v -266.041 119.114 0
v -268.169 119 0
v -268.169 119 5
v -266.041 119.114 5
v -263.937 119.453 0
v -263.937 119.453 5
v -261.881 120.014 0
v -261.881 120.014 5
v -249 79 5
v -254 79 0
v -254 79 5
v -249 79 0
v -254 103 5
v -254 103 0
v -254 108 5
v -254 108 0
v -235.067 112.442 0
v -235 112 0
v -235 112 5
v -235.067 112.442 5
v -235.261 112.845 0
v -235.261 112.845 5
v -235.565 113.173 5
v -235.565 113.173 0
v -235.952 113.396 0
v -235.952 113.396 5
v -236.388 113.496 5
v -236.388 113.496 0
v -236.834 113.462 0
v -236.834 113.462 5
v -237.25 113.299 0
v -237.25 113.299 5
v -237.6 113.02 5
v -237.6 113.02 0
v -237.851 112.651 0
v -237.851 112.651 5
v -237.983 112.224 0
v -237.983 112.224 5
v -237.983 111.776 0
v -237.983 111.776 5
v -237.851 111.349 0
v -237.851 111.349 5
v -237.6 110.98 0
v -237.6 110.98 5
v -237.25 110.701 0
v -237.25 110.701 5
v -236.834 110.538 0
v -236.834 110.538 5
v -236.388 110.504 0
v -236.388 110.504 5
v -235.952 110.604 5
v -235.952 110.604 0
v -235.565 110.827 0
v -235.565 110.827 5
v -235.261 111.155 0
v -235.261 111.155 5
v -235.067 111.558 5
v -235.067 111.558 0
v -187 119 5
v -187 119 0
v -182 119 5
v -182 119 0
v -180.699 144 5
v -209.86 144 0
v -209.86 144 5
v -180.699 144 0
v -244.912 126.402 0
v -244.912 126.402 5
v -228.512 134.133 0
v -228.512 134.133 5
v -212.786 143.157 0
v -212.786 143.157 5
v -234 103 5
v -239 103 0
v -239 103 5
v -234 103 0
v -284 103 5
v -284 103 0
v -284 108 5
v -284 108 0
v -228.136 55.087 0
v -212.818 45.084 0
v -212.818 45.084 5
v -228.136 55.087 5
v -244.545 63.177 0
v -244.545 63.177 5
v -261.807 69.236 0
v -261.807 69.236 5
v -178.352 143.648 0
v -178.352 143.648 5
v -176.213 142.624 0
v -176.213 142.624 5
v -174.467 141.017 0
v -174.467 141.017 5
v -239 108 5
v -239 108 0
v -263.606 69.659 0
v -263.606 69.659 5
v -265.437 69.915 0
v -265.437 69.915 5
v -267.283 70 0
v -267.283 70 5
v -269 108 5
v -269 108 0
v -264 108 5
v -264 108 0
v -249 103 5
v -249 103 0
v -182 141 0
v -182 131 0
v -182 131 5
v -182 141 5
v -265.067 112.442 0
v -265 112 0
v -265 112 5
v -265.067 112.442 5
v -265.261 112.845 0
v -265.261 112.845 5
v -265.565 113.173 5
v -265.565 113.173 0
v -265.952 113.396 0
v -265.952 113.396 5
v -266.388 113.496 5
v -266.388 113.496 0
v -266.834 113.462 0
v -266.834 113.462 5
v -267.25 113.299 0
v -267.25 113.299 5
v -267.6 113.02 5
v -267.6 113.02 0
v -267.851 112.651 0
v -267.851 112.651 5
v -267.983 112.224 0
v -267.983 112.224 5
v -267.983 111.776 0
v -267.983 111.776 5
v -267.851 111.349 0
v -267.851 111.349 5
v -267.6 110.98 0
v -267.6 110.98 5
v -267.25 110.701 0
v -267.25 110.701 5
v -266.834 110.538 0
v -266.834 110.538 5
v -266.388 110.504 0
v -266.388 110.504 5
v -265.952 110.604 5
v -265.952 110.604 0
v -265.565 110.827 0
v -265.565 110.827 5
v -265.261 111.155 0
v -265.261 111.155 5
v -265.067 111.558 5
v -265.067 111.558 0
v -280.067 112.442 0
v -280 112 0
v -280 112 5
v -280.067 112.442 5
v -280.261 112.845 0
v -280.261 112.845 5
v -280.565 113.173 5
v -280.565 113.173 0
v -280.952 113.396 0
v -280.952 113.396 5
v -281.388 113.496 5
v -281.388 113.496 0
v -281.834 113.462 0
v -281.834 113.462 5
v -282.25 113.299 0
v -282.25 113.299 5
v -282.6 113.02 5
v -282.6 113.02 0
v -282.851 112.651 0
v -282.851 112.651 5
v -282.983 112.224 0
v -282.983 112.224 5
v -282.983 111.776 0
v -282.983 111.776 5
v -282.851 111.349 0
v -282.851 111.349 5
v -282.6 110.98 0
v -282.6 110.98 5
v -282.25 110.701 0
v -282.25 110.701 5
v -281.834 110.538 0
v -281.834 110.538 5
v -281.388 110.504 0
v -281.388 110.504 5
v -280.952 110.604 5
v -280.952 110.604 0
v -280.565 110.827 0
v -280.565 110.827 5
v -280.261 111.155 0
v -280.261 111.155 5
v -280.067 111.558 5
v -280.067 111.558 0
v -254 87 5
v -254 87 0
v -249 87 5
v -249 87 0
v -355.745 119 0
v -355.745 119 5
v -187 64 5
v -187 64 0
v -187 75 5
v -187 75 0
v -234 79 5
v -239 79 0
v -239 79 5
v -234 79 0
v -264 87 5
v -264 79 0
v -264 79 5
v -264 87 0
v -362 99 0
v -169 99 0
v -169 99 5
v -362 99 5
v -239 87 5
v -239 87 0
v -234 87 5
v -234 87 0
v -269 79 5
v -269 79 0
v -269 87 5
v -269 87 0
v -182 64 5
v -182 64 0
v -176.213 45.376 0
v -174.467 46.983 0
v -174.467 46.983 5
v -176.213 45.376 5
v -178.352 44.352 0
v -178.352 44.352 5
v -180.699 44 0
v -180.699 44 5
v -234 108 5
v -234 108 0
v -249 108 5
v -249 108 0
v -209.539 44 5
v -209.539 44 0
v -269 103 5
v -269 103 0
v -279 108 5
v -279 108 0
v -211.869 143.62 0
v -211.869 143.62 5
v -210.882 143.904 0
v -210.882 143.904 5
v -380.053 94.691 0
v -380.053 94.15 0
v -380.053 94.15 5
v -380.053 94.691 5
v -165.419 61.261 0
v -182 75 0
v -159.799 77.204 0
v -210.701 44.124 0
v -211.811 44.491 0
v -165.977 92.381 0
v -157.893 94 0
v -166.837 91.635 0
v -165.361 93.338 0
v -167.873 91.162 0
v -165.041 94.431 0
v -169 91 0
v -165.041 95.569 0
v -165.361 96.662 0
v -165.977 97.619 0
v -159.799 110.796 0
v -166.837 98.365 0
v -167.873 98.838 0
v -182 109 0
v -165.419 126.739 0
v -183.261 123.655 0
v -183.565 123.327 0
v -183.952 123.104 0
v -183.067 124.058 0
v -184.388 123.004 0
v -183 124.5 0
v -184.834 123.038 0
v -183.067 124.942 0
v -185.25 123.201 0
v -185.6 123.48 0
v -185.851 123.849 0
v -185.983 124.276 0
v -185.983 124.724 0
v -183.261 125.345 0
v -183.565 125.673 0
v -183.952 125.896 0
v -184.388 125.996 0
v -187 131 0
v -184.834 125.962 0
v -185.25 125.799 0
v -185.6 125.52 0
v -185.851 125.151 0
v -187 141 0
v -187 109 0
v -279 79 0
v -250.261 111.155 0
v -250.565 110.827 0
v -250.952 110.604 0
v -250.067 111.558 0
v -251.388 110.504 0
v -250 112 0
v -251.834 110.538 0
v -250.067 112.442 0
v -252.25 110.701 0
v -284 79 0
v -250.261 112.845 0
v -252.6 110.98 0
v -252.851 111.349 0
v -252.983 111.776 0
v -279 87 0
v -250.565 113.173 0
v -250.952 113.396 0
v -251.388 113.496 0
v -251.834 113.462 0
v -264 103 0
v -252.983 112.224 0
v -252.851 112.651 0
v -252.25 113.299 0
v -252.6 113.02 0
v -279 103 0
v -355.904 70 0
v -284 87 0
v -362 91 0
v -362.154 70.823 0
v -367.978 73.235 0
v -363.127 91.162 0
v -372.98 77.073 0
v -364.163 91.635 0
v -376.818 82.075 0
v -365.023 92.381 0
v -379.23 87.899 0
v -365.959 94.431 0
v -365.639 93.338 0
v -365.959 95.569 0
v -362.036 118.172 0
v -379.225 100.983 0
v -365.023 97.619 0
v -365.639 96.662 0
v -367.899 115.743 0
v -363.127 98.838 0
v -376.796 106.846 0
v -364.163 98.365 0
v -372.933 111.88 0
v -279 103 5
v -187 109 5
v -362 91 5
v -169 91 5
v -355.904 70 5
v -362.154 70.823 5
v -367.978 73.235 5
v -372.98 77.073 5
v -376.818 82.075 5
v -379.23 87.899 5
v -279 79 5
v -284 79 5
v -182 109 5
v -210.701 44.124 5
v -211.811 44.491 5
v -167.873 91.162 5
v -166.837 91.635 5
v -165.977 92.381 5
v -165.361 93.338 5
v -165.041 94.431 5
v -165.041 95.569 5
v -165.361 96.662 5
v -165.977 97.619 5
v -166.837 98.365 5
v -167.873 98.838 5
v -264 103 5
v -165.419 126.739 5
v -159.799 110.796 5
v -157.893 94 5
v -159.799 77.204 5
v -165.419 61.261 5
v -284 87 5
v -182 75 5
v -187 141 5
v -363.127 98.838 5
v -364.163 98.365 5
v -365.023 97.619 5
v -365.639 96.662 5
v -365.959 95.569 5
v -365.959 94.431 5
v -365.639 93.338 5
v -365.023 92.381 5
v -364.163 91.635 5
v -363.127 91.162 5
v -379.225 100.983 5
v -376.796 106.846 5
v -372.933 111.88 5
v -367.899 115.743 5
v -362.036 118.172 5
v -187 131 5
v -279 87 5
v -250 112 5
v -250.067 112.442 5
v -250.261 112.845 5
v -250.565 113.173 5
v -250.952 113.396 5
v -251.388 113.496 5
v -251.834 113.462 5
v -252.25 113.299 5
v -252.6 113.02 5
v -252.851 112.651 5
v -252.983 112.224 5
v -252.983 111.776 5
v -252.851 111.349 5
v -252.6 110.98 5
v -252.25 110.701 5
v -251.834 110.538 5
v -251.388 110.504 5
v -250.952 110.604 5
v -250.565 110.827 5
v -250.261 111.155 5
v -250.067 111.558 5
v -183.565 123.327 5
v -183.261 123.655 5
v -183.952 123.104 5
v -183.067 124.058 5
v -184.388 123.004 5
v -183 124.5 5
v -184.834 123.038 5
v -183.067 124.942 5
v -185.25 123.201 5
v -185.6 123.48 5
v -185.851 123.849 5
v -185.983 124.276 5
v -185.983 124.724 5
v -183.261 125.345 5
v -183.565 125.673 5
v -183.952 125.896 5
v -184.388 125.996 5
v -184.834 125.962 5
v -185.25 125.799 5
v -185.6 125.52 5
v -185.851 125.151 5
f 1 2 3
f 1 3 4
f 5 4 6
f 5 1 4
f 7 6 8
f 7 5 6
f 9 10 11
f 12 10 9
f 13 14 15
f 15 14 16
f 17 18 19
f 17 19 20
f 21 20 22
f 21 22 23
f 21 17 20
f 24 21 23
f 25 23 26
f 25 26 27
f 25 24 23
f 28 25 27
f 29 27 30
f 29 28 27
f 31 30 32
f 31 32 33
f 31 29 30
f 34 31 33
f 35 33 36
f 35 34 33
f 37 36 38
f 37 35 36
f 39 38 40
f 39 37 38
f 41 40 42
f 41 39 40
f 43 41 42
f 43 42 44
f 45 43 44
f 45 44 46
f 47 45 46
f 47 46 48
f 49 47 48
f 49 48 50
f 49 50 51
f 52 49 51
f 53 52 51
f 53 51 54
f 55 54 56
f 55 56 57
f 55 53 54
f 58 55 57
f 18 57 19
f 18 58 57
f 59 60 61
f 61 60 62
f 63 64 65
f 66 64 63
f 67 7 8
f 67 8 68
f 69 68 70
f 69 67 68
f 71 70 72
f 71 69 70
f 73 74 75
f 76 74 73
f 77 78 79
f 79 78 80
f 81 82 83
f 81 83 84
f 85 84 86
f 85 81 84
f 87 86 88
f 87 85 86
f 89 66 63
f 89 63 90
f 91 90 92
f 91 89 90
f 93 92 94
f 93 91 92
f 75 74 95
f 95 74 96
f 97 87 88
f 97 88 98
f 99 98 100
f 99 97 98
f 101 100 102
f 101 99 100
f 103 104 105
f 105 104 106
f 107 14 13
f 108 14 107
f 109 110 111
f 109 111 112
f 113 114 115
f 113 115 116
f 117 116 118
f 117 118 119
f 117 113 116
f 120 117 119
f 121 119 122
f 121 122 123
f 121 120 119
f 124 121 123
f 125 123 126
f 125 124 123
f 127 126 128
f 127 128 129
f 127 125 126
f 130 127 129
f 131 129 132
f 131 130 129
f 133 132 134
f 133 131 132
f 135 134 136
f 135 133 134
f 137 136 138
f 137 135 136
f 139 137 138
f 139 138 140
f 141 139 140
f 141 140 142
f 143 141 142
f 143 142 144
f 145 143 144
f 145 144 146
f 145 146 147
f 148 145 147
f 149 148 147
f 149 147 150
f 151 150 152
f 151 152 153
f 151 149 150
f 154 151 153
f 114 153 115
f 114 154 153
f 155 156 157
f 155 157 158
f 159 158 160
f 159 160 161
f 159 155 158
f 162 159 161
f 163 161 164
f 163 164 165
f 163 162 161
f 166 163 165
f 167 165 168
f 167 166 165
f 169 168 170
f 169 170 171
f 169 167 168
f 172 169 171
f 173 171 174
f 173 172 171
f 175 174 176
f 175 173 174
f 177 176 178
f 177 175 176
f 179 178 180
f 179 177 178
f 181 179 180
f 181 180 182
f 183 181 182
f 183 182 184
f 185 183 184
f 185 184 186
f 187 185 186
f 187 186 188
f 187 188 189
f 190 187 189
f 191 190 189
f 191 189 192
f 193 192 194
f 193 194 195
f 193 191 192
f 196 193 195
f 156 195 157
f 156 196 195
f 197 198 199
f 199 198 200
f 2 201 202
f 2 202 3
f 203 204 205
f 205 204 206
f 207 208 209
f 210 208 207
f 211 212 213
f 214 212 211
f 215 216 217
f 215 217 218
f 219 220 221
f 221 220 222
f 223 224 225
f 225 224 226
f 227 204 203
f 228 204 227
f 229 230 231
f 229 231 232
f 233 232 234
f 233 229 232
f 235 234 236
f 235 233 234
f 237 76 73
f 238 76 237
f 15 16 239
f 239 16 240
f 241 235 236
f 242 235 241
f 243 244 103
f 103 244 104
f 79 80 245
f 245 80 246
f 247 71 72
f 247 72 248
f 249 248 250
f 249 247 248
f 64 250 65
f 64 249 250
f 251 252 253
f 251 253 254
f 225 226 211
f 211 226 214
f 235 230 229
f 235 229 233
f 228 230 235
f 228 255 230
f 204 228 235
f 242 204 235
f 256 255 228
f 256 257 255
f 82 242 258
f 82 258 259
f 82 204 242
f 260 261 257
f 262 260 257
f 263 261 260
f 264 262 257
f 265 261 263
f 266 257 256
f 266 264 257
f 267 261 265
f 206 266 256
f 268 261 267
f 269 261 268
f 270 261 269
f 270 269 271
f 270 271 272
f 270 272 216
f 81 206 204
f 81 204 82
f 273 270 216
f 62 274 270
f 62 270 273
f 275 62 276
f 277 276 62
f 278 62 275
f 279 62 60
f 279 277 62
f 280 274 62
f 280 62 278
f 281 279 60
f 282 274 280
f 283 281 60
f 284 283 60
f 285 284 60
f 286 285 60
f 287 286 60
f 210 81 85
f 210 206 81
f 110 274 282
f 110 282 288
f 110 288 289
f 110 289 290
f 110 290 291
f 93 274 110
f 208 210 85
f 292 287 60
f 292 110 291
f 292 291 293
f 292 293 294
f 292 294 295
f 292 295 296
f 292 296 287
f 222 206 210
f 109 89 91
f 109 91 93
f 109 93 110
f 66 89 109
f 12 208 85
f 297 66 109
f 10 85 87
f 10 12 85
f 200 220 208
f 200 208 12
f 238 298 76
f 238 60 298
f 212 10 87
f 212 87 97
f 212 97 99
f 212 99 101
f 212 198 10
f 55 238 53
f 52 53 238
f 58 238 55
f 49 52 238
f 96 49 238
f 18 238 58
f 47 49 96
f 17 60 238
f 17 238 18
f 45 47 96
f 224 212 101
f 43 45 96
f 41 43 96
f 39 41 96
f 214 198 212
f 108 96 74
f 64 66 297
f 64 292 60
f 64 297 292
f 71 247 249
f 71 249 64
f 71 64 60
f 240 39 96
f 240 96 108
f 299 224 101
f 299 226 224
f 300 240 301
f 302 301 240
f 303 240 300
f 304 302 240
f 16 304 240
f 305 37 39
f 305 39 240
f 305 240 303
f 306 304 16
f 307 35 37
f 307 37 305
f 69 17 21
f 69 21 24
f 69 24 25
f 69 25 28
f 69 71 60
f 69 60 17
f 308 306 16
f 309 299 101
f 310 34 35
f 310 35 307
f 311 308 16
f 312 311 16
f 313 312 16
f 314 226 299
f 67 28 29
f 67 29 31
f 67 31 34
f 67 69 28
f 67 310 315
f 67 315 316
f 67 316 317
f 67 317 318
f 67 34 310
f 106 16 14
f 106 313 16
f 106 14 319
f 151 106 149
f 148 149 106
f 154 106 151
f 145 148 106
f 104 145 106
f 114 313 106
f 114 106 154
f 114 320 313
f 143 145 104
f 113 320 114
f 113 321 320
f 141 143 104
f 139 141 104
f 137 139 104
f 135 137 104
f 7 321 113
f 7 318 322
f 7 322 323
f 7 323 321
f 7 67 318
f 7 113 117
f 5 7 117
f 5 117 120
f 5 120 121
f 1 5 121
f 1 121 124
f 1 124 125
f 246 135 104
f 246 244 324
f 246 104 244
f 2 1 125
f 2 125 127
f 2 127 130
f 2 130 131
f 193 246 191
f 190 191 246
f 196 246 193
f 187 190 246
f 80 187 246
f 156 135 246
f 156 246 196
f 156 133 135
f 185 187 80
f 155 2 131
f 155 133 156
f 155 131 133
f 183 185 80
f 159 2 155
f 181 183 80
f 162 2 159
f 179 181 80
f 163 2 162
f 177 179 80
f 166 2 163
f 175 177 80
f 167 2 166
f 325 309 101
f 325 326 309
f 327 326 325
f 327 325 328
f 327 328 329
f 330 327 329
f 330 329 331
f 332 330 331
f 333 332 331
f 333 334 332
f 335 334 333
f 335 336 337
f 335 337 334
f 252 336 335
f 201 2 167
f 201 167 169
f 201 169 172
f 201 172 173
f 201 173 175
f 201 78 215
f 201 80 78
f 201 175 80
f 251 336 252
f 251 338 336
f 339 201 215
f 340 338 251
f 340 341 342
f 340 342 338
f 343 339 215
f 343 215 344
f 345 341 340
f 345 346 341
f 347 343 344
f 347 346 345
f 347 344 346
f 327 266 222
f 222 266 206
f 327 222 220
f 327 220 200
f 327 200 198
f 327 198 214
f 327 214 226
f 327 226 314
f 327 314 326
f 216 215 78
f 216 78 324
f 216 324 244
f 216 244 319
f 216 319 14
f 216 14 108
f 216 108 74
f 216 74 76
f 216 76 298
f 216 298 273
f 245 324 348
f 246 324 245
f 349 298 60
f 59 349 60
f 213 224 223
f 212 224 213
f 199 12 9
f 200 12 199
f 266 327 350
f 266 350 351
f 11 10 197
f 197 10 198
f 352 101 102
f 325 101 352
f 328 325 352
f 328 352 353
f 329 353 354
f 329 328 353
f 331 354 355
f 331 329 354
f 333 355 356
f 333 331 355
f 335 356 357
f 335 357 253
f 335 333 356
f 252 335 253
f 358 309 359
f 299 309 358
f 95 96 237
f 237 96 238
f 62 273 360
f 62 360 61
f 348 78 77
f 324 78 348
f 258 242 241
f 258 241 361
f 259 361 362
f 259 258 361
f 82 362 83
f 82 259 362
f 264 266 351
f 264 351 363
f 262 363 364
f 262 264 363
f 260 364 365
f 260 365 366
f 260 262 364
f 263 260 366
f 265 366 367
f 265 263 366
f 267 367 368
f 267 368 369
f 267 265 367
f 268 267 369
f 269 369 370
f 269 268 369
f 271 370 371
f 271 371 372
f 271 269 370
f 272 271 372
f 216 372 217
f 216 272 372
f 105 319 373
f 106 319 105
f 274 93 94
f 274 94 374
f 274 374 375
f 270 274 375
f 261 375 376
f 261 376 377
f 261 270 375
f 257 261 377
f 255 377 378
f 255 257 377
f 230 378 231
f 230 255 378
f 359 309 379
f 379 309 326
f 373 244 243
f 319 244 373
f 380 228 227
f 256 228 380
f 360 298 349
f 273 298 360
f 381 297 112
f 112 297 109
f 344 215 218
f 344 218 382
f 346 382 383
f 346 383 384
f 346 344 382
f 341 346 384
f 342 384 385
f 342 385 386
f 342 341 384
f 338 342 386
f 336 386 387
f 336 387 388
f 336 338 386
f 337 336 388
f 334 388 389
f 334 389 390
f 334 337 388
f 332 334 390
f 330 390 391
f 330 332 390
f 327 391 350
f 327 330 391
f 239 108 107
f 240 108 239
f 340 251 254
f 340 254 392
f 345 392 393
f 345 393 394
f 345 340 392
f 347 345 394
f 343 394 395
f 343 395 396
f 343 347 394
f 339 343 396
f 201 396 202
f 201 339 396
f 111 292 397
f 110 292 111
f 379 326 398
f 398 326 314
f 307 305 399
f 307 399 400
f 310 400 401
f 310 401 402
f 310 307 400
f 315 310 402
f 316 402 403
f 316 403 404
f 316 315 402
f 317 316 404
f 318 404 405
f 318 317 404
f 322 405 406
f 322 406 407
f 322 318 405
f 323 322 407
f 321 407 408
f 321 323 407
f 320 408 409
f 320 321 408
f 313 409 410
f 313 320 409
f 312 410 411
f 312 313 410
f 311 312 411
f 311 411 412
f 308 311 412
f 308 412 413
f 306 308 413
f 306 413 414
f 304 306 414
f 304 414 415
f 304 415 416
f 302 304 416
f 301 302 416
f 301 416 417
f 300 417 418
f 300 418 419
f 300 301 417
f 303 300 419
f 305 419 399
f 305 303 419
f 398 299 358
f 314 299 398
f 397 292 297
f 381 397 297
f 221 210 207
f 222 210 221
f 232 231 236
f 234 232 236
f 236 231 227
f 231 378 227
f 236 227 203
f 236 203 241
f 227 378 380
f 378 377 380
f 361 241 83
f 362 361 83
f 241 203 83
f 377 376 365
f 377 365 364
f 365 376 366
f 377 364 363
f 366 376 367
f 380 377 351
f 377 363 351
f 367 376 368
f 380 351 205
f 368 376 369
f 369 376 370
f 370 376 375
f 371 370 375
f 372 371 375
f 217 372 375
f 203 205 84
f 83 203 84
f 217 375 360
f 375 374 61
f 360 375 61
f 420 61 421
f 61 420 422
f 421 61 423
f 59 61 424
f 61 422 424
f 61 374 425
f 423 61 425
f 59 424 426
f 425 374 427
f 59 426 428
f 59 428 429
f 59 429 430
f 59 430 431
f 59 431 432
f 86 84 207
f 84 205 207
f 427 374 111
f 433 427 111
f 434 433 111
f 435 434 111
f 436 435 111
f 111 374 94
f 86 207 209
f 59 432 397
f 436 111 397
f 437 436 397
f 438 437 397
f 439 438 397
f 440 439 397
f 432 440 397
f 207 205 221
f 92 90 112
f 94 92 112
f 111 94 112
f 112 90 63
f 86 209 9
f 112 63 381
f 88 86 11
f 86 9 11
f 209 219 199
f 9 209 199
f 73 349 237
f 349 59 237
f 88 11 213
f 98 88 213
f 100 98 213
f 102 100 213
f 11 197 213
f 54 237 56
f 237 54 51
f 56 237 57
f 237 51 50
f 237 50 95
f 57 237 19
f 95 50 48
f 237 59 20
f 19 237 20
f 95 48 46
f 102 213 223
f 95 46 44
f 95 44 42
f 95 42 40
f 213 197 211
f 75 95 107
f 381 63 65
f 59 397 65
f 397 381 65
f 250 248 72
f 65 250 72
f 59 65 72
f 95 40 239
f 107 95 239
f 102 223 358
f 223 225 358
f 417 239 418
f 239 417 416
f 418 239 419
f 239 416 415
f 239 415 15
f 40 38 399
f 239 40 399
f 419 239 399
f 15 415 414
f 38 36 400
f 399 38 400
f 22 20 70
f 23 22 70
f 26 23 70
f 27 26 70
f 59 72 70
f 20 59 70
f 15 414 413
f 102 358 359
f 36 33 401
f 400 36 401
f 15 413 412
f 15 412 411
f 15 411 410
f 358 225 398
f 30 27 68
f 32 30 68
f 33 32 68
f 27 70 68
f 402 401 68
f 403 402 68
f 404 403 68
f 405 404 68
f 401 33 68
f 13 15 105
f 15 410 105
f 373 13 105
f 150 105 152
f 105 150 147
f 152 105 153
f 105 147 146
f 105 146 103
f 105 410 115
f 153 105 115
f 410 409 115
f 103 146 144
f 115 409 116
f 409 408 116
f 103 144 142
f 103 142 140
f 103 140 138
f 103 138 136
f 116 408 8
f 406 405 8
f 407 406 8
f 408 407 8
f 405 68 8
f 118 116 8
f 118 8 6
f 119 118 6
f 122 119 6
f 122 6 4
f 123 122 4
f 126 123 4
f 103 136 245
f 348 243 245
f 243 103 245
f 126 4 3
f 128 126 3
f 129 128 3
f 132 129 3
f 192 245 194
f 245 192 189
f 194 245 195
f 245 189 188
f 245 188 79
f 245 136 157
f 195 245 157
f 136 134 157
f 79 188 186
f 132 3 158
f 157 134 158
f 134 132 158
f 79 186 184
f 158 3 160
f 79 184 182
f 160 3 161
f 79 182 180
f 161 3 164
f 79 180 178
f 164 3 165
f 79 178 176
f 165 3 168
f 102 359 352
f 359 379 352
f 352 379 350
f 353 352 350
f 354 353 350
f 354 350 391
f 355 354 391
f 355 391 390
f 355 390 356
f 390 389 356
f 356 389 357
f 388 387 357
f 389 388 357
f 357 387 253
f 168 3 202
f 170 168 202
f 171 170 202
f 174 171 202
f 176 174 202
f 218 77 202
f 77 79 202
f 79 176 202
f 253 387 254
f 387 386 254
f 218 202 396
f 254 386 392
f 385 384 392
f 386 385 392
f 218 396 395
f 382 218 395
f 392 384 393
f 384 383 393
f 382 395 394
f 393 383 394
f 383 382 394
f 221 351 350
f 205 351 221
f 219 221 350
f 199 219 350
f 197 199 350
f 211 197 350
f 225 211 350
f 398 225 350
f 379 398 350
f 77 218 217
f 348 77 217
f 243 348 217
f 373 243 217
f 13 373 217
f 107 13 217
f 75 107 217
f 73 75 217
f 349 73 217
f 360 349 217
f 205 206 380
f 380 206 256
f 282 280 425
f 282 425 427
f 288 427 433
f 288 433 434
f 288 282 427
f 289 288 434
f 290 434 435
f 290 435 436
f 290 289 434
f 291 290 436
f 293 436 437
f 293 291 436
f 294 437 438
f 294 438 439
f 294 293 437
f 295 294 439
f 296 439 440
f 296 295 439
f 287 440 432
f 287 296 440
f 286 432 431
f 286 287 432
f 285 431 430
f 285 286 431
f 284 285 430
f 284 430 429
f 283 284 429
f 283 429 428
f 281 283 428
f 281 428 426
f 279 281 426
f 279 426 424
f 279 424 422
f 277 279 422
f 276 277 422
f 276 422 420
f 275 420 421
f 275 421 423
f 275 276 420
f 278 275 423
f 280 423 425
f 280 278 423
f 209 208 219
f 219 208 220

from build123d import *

# Parameters (mm, degrees)
MODEL_R                  = 1.500000022
MODEL_W                  = 5.000000119
MODEL_H                  = 5.000000119
MODEL_H_2                = 8.000000119
MODEL_H_3                = 11.000000119
MODEL_H_4                = 10
RESSALTO_EXTRUS_O1_DEPTH = 5


with BuildPart() as part:
    # Model → Ressalto-extrusão1 (new body)
    with BuildSketch(Plane.XY):
        with BuildLine():
            Line((-180.698726154, 44.000000686), (-209.539314988, 44.000000686))
            ThreePointArc((-209.539314988, 44.000000686), (-211.26607554, 44.278095095), (-212.818217016, 45.084255959))
            ThreePointArc((-212.818217016, 45.084255959), (-236.218705268, 59.378884867), (-261.807031602, 69.235700855))
            ThreePointArc((-261.807031602, 69.235700855), (-264.518550223, 69.808004431), (-267.283148189, 70.000001046))
            Line((-267.283148189, 70.000001046), (-355.903623858, 70.000001046))
            ThreePointArc((-355.903623858, 70.000001046), (-372.979904567, 77.073228111), (-380.053131631, 94.149508819))
            Line((-380.053131631, 94.149508819), (-380.053131631, 94.691449457))
            ThreePointArc((-380.053131631, 94.691449457), (-372.93332153, 111.880191563), (-355.744579423, 119.000001664))
            Line((-355.744579423, 119.000001664), (-268.169073012, 119.000001664))
            ThreePointArc((-268.169073012, 119.000001664), (-264.984221388, 119.255211968), (-261.880650458, 120.014329651))
            ThreePointArc((-261.880650458, 120.014329651), (-236.634658237, 130.102883651), (-212.786381277, 143.156570145))
            ThreePointArc((-212.786381277, 143.156570145), (-211.382514446, 143.784939438), (-209.859544299, 144.000002169))
            Line((-209.859544299, 144.000002169), (-180.698726151, 144.000002169))
            ThreePointArc((-180.698726151, 144.000002169), (-177.244327452, 143.215757822), (-174.467201918, 141.016784577))
            ThreePointArc((-174.467201918, 141.016784577), (-157.893223845, 94.000001427), (-174.467201921, 46.983218277))
            ThreePointArc((-174.467201921, 46.983218277), (-177.244327455, 44.784245034), (-180.698726154, 44.000000686))
        make_face()
        with Locations((-281.500004195, 112.000001669)):
            Circle(MODEL_R, mode=Mode.SUBTRACT)
        with Locations((-184.500002749, 124.500001855)):
            Circle(MODEL_R, mode=Mode.SUBTRACT)
        with Locations((-251.500003748, 112.000001669)):
            Circle(MODEL_R, mode=Mode.SUBTRACT)
        with Locations((-236.500003524, 112.000001669)):
            Circle(MODEL_R, mode=Mode.SUBTRACT)
        with Locations((-266.500003971, 112.000001669)):
            Circle(MODEL_R, mode=Mode.SUBTRACT)
        with Locations((-281.499999941, 105.500001595)):
            Rectangle(MODEL_W, MODEL_H, mode=Mode.SUBTRACT)
        with Locations((-281.499999941, 83.000001236)):
            Rectangle(MODEL_W, MODEL_H_2, mode=Mode.SUBTRACT)
        with Locations((-236.50000006, 105.500001595)):
            Rectangle(MODEL_W, MODEL_H, mode=Mode.SUBTRACT)
        with Locations((-236.50000006, 83.000001236)):
            Rectangle(MODEL_W, MODEL_H_2, mode=Mode.SUBTRACT)
        with Locations((-251.499999941, 83.000001236)):
            Rectangle(MODEL_W, MODEL_H_2, mode=Mode.SUBTRACT)
        with Locations((-251.499999941, 105.500001595)):
            Rectangle(MODEL_W, MODEL_H, mode=Mode.SUBTRACT)
        with Locations((-184.499999941, 69.500001367)):
            Rectangle(MODEL_W, MODEL_H_3, mode=Mode.SUBTRACT)
        with Locations((-184.499999941, 136.000001903)):
            Rectangle(MODEL_W, MODEL_H_4, mode=Mode.SUBTRACT)
        with Locations((-184.499999941, 114.000001664)):
            Rectangle(MODEL_W, MODEL_H_4, mode=Mode.SUBTRACT)
        with Locations((-266.499999941, 83.000001236)):
            Rectangle(MODEL_W, MODEL_H_2, mode=Mode.SUBTRACT)
        with Locations((-266.499999941, 105.500001595)):
            Rectangle(MODEL_W, MODEL_H, mode=Mode.SUBTRACT)
        with BuildLine():
            Line((-362.000002593, 91.000001416), (-169.000002593, 91.000001416))
            ThreePointArc((-169.000002593, 91.000001416), (-165.000002841, 95.000001167), (-169.000002593, 99.000000919))
            Line((-169.000002593, 99.000000919), (-362.000002593, 99.000000919))
            ThreePointArc((-362.000002593, 99.000000919), (-366.000002344, 95.000001167), (-362.000002593, 91.000001416))
        make_face(mode=Mode.SUBTRACT)
    extrude(amount=RESSALTO_EXTRUS_O1_DEPTH)


solid = part.part
